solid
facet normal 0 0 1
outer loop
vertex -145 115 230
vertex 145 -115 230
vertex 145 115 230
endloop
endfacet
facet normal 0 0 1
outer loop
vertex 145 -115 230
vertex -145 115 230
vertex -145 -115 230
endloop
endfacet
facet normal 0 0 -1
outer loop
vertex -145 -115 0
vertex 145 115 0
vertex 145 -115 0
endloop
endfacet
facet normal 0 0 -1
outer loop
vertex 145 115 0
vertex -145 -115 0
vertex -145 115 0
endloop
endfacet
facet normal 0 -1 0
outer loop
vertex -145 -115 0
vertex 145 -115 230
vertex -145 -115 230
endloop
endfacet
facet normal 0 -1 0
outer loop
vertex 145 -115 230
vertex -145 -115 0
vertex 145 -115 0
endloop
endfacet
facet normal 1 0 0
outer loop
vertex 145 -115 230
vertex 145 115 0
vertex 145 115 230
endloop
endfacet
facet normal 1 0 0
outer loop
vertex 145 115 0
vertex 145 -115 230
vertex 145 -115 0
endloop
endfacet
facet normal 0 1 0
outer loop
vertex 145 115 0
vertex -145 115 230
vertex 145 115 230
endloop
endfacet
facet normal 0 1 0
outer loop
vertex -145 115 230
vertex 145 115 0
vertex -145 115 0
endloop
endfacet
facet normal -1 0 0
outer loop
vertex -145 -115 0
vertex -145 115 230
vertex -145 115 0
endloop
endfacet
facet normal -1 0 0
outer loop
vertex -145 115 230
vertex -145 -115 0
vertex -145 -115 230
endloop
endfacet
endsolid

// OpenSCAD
// Generated documentary F1 envelope proxy.
// Not manufacturing geometry, not dimensionally validated, not SimReady.
proxy_id = "993-TURBOCHARGER-K16-24-FVD";
$fn = 96;

length_mm = 290;
width_mm = 230;
height_mm = 230;

translate([-length_mm / 2, -width_mm / 2, 0])
    cube([length_mm, width_mm, height_mm], center = false);
